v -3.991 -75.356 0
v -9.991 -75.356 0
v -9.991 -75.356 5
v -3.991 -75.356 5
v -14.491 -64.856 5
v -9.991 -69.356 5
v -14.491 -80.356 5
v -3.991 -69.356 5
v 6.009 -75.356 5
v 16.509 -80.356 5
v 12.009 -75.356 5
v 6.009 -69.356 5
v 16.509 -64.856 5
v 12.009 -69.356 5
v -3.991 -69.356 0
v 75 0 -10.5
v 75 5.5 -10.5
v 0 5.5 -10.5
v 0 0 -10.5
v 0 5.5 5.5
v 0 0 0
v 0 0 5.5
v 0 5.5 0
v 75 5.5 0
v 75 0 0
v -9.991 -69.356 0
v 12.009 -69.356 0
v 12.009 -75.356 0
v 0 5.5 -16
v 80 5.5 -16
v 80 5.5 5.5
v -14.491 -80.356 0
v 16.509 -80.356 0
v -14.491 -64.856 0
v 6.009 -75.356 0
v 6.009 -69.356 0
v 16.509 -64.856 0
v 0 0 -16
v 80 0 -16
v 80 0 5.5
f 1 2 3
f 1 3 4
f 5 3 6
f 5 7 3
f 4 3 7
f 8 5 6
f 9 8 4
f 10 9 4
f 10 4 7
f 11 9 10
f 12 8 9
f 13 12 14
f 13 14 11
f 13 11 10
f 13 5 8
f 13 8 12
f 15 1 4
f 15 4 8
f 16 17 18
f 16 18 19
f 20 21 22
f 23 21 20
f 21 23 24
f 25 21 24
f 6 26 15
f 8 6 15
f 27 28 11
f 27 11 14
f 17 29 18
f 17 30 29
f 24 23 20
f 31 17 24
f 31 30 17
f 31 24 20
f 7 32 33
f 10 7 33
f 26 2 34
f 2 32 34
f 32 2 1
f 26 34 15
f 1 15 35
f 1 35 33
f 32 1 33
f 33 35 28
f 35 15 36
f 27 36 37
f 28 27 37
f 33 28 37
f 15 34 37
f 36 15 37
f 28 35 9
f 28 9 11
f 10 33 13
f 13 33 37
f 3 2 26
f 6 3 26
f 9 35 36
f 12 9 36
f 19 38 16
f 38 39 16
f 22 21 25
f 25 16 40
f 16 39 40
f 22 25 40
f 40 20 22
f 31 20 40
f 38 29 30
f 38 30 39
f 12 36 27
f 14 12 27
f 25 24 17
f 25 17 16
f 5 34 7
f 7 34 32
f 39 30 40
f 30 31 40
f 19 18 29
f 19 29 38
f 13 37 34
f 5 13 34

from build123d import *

# Parameters (mm, degrees)
F0_W     = 80
F0_H     = 5.5
F1_DEPTH = 5.5
F2_W     = 5
F2_H     = 5.5
F3_DEPTH = 16
F4_W     = 5.5
F4_H     = 5.5
F5_DEPTH = 75
F6_W     = 6
F6_H     = 6
F7_DEPTH = 5


with BuildPart() as f1:
    # F0 (on Top) → F1 (new body)
    with BuildSketch(Plane.XY):
        with Locations((40, 2.75)):
            Rectangle(F0_W, F0_H)
    extrude(amount=F1_DEPTH)

    # F2 (on face) → F3 (join)
    with BuildSketch(Plane(origin=(0, 0, 0), x_dir=(1, 0, 0), z_dir=(0, 0, -1))):
        with Locations((77.5, -2.75)):
            Rectangle(F2_W, F2_H)
    extrude(amount=F3_DEPTH)

    # F4 (on face) → F5 (join)
    with BuildSketch(Plane(origin=(75, 0, 0), x_dir=(0, -1, 0), z_dir=(-1, 0, 0))):
        with Locations((-2.75, -13.25)):
            Rectangle(F4_W, F4_H)
    extrude(amount=F5_DEPTH)


with BuildPart() as f7:
    # F6 (on Top) → F7 (new body)
    with BuildSketch(Plane.XY):
        Polygon((16.508894, -80.355972), (16.508894, -64.855972), (1.008894, -64.855972), (-14.491106, -64.855972), (-14.491106, -80.355972), align=None)
        with Locations((-6.991106, -72.355972)):
            Rectangle(F6_W, F6_H, mode=Mode.SUBTRACT)
        with Locations((9.008894, -72.355972)):
            Rectangle(F6_W, F6_H, mode=Mode.SUBTRACT)
    extrude(amount=F7_DEPTH)


solid = Compound([f1.part, f7.part])
